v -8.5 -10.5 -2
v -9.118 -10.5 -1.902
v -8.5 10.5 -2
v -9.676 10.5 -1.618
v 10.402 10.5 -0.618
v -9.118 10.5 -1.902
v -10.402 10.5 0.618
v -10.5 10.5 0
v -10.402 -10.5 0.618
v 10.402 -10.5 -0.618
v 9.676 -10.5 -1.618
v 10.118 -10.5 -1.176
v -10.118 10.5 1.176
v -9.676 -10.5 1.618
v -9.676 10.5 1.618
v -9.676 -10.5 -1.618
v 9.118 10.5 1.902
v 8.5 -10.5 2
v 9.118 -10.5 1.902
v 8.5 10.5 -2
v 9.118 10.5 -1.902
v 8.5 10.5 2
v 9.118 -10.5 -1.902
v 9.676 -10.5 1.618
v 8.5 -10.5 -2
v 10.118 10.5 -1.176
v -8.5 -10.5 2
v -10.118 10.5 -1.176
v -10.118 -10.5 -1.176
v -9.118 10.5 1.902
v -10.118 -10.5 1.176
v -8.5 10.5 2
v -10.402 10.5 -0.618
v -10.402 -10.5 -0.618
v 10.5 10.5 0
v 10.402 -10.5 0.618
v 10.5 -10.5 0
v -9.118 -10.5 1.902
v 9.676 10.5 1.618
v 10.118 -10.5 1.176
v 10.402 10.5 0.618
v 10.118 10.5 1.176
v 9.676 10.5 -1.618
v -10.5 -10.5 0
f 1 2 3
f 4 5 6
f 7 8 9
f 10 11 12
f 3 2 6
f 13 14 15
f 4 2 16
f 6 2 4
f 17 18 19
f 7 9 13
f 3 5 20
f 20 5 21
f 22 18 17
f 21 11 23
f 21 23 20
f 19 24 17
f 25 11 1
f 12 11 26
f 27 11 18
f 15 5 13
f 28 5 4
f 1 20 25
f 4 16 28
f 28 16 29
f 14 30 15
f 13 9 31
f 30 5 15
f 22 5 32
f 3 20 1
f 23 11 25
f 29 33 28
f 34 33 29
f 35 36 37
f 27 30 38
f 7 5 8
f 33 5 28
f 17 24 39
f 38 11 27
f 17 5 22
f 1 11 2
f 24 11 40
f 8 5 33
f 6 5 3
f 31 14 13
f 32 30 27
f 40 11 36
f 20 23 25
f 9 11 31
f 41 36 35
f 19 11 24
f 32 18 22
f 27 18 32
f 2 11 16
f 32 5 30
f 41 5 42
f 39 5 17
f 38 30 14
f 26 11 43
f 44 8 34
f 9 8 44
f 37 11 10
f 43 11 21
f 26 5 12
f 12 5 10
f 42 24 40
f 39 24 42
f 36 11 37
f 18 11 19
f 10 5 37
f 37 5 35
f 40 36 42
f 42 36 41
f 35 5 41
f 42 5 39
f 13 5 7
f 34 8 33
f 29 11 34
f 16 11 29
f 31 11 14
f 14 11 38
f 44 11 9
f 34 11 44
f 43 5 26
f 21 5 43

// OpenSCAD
// file: ../lib/brick-hollow.scad
echo(version=version());

module brickHollow(height=9.3, fade=2.5, minSize=[4.6,4.6], maxSize=[5.2, 5.2], center = false){
    echo(height, minSize, maxSize, fade);
    sizeX = max(minSize[0],maxSize[0]); 
   sizeY = max(minSize[1],maxSize[1]); 
    
    posX = center ? 0 : 0.5*sizeX; 
   posY = center ? 0 : 0.5*sizeY;   
   posZ = center ? -0.5 * (height-fade) : 0.5*fade;
    
    cutHelper = 0.2;
    overlapSpace=0.1;
    
    translate([posX, posY, posZ]){
        union(){
            polyhedron(points=[
                [-0.5*minSize[0],-0.5*minSize[1],-0.5*fade],
                [0.5*minSize[0],-0.5*minSize[1],-0.5*fade],
                [0.5*minSize[0],0.5*minSize[1],-0.5*fade],
                [-0.5*minSize[0],0.5*minSize[1],-0.5*fade],
                [-0.5*maxSize[0],-0.5*maxSize[1],0.5*fade],
                [0.5*maxSize[0],-0.5*maxSize[1],0.5*fade],
                [0.5*maxSize[0],0.5*maxSize[1],0.5*fade],
                [-0.5*maxSize[0],0.5*maxSize[1],0.5*fade]
            ], faces=[[0,1,2,3],[1,0,4,5],[2,1,5,6],[3,2,6,7],[0,3,7,4],[7,6,5,4]]);
            
            if(height > fade){
                translate([0,0,0.5*height - overlapSpace]){
                    cube([maxSize[0], maxSize[1], height - fade + overlapSpace], center=true);
                }
            }
            
            translate([0,0,-0.5*(fade + cutHelper) + overlapSpace]){
                cube([minSize[0], minSize[1], cutHelper + overlapSpace], center=true);
            }
        }
    }
}

//brickHollow(height=9.3, maxSize=[5.2,5.2], minSize=[4.6,4.6], center=true);
// file: ../lib/roundedcube_simple.scad
module roundedcube_simple(size = [1, 1, 1], center = false, radius = 0.5, resolution = 20) {
	// If single value, convert to [x, y, z] vector
	size = (size[0] == undef) ? [size, size, size] : size;

	translate = (center == false) ?
		[radius, radius, radius] :
		[
			radius - (size[0] / 2),
			radius - (size[1] / 2),
			radius - (size[2] / 2)
	];

	translate(v = translate)
	minkowski() {
		cube(size = [
			size[0] - (radius * 2),
			size[1] - (radius * 2),
			size[2] - (radius * 2)
		]);
		sphere(r = radius, $fn = resolution);
	}
}
// file: ../lib/roundedcube.scad
// More information: https://danielupshaw.com/openscad-rounded-corners/

// Set to 0.01 for higher definition curves (renders slower)
$fs = 0.15;

module roundedcube(size = [1, 1, 1], center = false, radius = 0.5, apply_to = "all", resolution = 20) {
	// If single value, convert to [x, y, z] vector
	size = (size[0] == undef) ? [size, size, size] : size;

	translate_min = radius;
	translate_xmax = size[0] - radius;
	translate_ymax = size[1] - radius;
	translate_zmax = size[2] - radius;

	diameter = radius * 2;

	obj_translate = (center == false) ?
		[0, 0, 0] : [
			-(size[0] / 2),
			-(size[1] / 2),
			-(size[2] / 2)
		];

	translate(v = obj_translate) {
		hull() {
			for (translate_x = [translate_min, translate_xmax]) {
				x_at = (translate_x == translate_min) ? "min" : "max";
				for (translate_y = [translate_min, translate_ymax]) {
					y_at = (translate_y == translate_min) ? "min" : "max";
					for (translate_z = [translate_min, translate_zmax]) {
						z_at = (translate_z == translate_min) ? "min" : "max";

						translate(v = [translate_x, translate_y, translate_z])
						if (
							(apply_to == "all") ||
							(apply_to == "xmin" && x_at == "min") || (apply_to == "xmax" && x_at == "max") ||
							(apply_to == "ymin" && y_at == "min") || (apply_to == "ymax" && y_at == "max") ||
							(apply_to == "zmin" && z_at == "min") || (apply_to == "zmax" && z_at == "max")
						) {
							sphere(r = radius, $fn = resolution);
						} else {
							rotate = 
								(apply_to == "xmin" || apply_to == "xmax" || apply_to == "x") ? [0, 90, 0] : (
								(apply_to == "ymin" || apply_to == "ymax" || apply_to == "y") ? [90, 90, 0] :
								[0, 0, 0]
							);
							rotate(a = rotate)
							cylinder(h = diameter, r = radius, center = true, $fn = resolution);
						}
					}
				}
			}
		}
	}
}
// main file
echo(version=version());

include <../lib/block-v2.scad>;

width = 21;
height = 4;

roundedcube([width, width, height], true, 2, "y");
